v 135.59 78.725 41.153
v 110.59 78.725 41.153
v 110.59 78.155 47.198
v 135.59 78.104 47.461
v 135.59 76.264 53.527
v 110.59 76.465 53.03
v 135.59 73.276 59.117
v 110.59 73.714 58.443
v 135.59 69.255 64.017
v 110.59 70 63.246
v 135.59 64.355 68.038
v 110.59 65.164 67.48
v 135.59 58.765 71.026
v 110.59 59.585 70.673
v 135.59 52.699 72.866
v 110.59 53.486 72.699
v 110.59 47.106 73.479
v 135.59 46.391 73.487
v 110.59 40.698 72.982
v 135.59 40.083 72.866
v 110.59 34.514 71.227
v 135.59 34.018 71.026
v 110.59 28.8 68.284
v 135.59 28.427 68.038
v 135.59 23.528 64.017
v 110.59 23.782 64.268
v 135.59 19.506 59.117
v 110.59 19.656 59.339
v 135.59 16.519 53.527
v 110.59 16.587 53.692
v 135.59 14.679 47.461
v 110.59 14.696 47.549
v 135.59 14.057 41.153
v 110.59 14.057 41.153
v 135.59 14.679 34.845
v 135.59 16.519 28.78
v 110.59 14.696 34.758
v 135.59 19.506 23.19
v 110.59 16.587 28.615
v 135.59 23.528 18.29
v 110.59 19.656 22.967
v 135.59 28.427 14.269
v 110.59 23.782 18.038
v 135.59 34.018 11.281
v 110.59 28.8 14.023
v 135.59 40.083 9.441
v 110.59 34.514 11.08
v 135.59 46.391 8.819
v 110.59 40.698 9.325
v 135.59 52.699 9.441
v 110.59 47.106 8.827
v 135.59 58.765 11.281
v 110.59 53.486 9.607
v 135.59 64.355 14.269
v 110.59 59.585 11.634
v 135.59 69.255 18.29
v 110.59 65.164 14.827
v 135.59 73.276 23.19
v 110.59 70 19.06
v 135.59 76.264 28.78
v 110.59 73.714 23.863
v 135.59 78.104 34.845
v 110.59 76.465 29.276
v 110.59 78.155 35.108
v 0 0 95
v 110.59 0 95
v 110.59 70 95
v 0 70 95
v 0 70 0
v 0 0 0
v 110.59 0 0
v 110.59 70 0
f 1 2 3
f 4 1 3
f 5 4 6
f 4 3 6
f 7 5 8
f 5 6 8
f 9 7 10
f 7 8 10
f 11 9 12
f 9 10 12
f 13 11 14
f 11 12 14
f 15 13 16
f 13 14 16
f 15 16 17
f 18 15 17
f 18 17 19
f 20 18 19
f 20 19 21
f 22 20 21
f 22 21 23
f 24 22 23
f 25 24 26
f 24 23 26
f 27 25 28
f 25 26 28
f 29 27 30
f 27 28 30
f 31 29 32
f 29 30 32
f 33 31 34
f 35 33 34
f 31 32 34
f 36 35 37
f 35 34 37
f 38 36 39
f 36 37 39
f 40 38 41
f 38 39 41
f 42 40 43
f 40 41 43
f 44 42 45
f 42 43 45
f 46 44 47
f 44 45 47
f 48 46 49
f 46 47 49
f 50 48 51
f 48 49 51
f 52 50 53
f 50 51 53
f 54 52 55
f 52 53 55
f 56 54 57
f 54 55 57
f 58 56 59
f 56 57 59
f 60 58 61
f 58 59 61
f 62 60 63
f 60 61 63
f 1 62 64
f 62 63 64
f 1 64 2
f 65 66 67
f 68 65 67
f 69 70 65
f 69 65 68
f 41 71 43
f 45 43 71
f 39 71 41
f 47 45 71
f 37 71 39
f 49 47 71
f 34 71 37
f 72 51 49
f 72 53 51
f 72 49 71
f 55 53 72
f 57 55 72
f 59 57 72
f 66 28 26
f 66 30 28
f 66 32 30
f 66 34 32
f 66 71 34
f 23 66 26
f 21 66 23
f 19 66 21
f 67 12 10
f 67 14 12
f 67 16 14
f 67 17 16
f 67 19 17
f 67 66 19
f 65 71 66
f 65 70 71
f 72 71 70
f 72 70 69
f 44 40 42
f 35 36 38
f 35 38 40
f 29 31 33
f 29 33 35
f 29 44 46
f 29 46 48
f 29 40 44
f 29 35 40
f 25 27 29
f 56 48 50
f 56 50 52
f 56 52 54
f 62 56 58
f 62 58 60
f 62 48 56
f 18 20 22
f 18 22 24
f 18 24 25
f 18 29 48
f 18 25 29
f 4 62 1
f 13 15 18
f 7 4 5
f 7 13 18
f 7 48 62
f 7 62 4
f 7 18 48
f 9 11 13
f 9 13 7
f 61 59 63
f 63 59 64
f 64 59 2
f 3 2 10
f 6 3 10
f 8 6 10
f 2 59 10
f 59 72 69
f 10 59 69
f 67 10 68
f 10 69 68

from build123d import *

# Parameters (mm, degrees)
F0_W      = 50
F0_H      = 70
F1_DEPTH  = 95
F1_FACE_W = 70
F1_FACE_H = 95
F2_DEPTH  = 60.59026
F3_R      = 32.333924
F4_DEPTH  = 25
F5_R      = 16.327399
F6_DEPTH  = 10


with BuildPart() as f1:
    # F0 (on Top) → F1 (new body)
    with BuildSketch(Plane.XY):
        with Locations((25, 35)):
            Rectangle(F0_W, F0_H)
    extrude(amount=F1_DEPTH)

    # F1_face (on face) → F2 (join)
    with BuildSketch(Plane(origin=(50, 35, 47.5), x_dir=(0, 1, 0), z_dir=(1, 0, 0))):
        Rectangle(F1_FACE_W, F1_FACE_H)
    extrude(amount=F2_DEPTH)

    # F3 (on face) → F4 (join)
    with BuildSketch(Plane.YZ.offset(110.59026)):
        with Locations((46.391159, 41.153282)):
            Circle(F3_R)
    extrude(amount=F4_DEPTH)

    # F5 (on face) → F6 (join)
    with BuildSketch(Plane.YZ.offset(135.59026)):
        with Locations((46.391159, 41.153282)):
            Circle(F5_R)
    extrude(amount=-F6_DEPTH)


solid = f1.part
